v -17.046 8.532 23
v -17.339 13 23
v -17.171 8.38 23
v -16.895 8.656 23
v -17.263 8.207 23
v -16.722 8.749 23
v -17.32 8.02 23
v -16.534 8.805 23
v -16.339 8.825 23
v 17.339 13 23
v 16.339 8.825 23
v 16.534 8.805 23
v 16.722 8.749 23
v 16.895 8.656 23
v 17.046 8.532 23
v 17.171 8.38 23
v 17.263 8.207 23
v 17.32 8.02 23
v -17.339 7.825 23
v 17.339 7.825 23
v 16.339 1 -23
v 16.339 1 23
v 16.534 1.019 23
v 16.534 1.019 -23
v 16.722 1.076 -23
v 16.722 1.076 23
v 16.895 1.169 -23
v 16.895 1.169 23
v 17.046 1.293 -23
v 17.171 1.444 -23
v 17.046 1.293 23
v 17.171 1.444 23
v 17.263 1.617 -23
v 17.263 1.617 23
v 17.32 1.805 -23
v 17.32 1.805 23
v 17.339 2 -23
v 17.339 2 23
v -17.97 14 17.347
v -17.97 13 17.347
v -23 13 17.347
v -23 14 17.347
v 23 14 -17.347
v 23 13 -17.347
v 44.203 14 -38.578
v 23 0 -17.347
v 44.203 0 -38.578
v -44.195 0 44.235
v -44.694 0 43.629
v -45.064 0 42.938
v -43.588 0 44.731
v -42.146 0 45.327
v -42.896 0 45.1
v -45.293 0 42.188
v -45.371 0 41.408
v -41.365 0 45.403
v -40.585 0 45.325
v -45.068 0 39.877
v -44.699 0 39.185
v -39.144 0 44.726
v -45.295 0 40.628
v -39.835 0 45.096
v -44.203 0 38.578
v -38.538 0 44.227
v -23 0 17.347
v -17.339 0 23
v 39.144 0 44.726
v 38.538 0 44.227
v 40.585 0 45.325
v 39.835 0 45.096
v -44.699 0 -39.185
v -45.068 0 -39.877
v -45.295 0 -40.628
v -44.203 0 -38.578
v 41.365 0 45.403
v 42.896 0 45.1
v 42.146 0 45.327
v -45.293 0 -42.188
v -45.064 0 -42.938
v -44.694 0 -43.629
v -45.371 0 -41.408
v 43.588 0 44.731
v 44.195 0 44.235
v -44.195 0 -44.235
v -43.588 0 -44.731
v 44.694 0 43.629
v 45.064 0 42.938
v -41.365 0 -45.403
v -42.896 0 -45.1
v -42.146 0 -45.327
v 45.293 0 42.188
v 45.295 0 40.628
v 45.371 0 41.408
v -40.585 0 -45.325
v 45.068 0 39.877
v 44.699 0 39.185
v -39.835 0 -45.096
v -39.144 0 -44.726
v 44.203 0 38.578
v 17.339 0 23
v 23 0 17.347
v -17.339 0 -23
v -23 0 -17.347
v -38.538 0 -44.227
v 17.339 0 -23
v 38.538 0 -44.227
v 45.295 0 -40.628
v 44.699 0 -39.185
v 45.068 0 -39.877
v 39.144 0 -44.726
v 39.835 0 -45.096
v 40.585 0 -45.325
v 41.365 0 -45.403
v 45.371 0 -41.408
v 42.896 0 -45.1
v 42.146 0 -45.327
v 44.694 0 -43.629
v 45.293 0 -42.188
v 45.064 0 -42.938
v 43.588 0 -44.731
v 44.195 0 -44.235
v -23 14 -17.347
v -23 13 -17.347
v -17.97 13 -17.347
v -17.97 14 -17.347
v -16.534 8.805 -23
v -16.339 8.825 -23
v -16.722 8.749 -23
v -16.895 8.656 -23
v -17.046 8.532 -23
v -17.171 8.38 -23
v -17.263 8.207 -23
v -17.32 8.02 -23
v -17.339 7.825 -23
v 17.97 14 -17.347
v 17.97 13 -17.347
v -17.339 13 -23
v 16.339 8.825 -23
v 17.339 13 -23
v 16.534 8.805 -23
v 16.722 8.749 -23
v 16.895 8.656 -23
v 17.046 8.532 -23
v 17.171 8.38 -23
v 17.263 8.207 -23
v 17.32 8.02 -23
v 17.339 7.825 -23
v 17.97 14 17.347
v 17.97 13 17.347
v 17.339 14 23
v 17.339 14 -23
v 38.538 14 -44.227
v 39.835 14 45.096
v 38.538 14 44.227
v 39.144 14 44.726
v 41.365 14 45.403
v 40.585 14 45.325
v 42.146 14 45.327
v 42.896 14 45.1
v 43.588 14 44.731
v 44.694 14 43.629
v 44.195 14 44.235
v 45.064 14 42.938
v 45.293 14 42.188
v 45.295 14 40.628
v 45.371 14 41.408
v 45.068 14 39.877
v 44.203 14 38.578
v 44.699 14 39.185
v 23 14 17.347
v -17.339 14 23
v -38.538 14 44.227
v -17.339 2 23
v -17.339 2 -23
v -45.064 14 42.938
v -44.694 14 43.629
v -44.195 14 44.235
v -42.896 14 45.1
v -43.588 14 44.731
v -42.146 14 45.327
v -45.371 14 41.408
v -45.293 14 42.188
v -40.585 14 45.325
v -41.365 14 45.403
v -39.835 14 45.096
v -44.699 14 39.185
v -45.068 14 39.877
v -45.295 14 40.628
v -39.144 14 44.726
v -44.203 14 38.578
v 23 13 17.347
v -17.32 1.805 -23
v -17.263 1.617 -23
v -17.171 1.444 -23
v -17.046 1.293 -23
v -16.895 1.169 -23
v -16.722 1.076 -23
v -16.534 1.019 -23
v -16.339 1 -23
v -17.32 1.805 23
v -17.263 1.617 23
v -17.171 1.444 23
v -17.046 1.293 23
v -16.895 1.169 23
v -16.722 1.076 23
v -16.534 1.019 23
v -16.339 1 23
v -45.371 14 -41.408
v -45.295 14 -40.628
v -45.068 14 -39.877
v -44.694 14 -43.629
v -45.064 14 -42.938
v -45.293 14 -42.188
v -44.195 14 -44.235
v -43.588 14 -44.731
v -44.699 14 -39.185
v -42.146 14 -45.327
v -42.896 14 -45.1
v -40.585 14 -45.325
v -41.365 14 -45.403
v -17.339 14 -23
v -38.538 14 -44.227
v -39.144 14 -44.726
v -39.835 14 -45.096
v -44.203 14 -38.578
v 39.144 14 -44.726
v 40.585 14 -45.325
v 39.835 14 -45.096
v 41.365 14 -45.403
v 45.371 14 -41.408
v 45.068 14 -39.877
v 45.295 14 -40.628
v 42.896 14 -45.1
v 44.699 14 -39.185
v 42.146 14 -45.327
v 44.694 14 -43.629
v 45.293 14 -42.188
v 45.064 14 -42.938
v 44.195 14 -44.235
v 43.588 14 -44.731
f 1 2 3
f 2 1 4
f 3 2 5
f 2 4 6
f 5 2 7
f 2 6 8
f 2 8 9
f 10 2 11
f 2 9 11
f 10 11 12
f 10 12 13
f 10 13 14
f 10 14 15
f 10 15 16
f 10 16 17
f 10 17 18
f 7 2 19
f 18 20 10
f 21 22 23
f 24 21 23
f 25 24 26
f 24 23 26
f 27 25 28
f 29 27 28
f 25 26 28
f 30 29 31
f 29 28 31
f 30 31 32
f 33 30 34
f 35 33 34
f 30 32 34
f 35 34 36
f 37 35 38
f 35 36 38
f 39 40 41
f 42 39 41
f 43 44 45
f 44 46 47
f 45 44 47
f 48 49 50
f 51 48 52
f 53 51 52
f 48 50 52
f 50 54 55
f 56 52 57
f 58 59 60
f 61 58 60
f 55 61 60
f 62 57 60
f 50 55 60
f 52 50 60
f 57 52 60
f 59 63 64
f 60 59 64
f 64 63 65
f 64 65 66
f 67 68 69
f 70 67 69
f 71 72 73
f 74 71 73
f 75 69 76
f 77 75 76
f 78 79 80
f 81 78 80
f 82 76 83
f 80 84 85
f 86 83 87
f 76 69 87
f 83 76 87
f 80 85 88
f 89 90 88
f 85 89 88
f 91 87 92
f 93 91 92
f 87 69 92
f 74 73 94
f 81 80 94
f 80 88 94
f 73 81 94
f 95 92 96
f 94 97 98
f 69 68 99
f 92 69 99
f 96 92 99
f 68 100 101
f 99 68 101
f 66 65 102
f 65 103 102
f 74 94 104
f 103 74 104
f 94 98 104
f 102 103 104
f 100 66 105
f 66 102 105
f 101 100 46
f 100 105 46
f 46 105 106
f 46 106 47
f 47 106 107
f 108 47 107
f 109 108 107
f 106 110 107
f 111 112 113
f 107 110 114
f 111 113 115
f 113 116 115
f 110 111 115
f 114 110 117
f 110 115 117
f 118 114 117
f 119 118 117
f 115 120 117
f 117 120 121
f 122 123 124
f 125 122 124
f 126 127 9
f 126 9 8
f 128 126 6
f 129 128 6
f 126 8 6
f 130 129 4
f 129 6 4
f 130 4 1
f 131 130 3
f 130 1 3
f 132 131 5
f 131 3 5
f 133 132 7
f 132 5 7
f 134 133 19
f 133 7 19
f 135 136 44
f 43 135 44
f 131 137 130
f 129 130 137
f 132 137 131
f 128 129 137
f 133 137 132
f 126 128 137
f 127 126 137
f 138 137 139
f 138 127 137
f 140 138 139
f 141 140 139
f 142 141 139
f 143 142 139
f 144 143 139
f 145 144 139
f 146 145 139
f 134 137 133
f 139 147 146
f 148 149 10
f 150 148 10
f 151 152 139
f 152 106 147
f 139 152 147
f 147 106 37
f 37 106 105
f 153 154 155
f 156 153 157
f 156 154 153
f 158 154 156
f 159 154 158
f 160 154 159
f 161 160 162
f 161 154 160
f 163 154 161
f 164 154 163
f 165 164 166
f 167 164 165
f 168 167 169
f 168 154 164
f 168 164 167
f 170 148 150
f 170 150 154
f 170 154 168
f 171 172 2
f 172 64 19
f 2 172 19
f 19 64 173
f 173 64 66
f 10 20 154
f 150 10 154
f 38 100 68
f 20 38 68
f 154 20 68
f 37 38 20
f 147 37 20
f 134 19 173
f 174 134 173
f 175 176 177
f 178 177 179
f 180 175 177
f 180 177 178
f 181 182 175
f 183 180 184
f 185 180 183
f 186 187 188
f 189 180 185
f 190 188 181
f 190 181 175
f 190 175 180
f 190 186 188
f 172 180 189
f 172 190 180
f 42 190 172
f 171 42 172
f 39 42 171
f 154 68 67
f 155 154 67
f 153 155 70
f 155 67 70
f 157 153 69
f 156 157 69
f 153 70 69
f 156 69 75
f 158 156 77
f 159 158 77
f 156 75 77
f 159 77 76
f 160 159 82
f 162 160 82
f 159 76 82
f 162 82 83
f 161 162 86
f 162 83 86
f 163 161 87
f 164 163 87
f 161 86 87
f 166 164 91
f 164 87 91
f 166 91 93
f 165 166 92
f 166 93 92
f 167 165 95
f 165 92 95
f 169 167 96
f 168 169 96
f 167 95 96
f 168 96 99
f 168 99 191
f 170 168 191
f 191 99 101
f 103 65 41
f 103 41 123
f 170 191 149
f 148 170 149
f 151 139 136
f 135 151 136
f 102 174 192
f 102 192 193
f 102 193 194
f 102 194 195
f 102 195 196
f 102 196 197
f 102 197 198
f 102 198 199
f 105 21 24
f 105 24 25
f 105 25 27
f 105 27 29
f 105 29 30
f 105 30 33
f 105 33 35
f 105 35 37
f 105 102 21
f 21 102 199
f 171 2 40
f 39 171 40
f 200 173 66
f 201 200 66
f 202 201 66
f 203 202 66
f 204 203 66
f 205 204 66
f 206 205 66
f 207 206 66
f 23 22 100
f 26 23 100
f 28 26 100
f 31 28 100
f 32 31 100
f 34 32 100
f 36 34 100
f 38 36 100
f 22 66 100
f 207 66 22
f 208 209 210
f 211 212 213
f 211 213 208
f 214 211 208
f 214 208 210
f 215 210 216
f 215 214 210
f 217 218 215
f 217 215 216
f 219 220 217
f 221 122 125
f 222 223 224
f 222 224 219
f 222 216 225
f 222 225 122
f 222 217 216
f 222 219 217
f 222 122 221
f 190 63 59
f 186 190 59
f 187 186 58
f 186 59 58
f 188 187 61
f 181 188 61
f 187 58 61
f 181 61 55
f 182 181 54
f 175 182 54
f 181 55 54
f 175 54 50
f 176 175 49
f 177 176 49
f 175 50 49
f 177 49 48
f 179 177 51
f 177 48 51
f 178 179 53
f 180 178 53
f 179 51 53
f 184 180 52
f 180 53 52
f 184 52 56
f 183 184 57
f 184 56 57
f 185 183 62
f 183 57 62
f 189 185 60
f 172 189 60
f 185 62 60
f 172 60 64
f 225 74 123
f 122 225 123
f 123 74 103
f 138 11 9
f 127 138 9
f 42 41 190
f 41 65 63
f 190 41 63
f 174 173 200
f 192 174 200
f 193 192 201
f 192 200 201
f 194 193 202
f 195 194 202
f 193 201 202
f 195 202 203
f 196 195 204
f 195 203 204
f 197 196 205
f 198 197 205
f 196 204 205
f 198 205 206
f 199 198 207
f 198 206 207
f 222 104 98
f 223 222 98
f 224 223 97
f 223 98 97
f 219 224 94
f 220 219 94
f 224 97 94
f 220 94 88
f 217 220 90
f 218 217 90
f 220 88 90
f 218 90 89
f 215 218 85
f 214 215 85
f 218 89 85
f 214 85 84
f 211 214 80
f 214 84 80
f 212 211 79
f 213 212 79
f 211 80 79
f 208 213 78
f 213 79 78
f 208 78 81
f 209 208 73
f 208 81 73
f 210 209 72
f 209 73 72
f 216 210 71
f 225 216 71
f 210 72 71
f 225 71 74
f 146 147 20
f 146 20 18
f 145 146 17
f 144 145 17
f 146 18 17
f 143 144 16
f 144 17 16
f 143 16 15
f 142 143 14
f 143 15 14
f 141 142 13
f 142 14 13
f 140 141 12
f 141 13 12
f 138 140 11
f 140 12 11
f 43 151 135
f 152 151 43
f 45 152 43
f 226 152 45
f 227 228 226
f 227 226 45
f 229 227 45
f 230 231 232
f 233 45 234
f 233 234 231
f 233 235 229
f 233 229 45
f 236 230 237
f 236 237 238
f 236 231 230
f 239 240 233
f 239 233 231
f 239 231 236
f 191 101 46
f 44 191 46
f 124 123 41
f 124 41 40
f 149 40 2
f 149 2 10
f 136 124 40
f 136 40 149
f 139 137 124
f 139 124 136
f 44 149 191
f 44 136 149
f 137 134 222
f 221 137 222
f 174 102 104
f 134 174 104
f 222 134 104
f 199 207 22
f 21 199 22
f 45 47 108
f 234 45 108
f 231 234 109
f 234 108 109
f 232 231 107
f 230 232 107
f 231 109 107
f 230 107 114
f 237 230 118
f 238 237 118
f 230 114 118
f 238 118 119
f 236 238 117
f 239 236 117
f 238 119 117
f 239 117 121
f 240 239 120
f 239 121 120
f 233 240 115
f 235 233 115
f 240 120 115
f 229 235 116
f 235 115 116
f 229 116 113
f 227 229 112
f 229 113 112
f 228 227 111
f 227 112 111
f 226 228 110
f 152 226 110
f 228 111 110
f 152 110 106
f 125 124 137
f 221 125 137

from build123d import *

# Parameters (mm, degrees)
SKETCH1_W           = 46
SKETCH1_H           = 46
BOSS_EXTRUDE1_DEPTH = 13
CUT_EXTRUDE2_DEPTH  = 10
BOSS_EXTRUDE2_START = -13
BOSS_EXTRUDE2_DEPTH = 14
CUT_EXTRUDE4_DEPTH  = 63


# Read off the part's stored shape, not the designer's step: Boss-Extrude2
with BuildPart() as part:
    # Sketch1 → Boss-Extrude1 (new body)
    with BuildSketch(Plane(origin=(0, 0, 0), x_dir=(1, 0, 0), z_dir=(0, 1, 0))):
        Rectangle(SKETCH1_W, SKETCH1_H)
    extrude(amount=BOSS_EXTRUDE1_DEPTH)

    # Sketch2 → Cut-Extrude2 (cut)
    with BuildSketch(Plane(origin=(0, 13, 0), x_dir=(1, 0, 0), z_dir=(0, 1, 0))):
        Polygon((17.339375574, 23), (17.969631493, 17.346908404), (23, 17.346908404), (23, 23), align=None)
        Polygon((-23, 23), (-17.339375574, 23), (-17.969631493, 17.346908404), (-23, 17.346908404), align=None)
        Polygon((-23, -17.346908404), (-23, -23), (-17.339375574, -23), (-17.969631493, -17.346908404), align=None)
        Polygon((17.339375574, -23), (23, -23), (23, -17.346908404), (17.969631493, -17.346908404), align=None)
    extrude(amount=-CUT_EXTRUDE2_DEPTH, mode=Mode.SUBTRACT)

    # Boss-Extrude2 outline → Boss-Extrude2 (add)
    with BuildSketch(Plane(origin=(0, 13, 0), x_dir=(1, 0, 0), z_dir=(0, 1, 0)).offset(BOSS_EXTRUDE2_START)):
        with BuildLine():
            Line((-38.538452146, -44.227320898), (-17.339375574, -23))
            Line((-17.339375574, -23), (-17.969631493, -17.346908404))
            Line((-17.969631493, -17.346908404), (-23, -17.346908404))
            Line((-23, -17.346908404), (-44.202839223, -38.577999476))
            ThreePointArc((-44.202839223, -38.577999476), (-44.195306563, -44.234853893), (-38.538452146, -44.227320898))
        make_face()
        with BuildLine():
            Line((-17.969631493, 17.346908404), (-17.339375574, 23))
            Line((-17.339375574, 23), (-38.538452146, 44.227320898))
            ThreePointArc((-38.538452146, 44.227320898), (-44.195306563, 44.234853893), (-44.202839223, 38.577999476))
            Line((-44.202839223, 38.577999476), (-23, 17.346908404))
            Line((-23, 17.346908404), (-17.969631493, 17.346908404))
        make_face()
        with BuildLine():
            Line((44.202839223, -38.577999476), (23, -17.346908404))
            Line((23, -17.346908404), (17.969631493, -17.346908404))
            Line((17.969631493, -17.346908404), (17.339375574, -23))
            Line((17.339375574, -23), (38.538452146, -44.227320898))
            ThreePointArc((38.538452146, -44.227320898), (44.195306563, -44.234853893), (44.202839223, -38.577999476))
        make_face()
        with BuildLine():
            Line((17.969631493, 17.346908404), (23, 17.346908404))
            Line((23, 17.346908404), (44.202839223, 38.577999476))
            ThreePointArc((44.202839223, 38.577999476), (44.195306563, 44.234853893), (38.538452146, 44.227320898))
            Line((38.538452146, 44.227320898), (17.339375574, 23))
            Line((17.339375574, 23), (17.969631493, 17.346908404))
        make_face()
    extrude(amount=BOSS_EXTRUDE2_DEPTH)

    # Sketch5 → Cut-Extrude4 (cut)
    with BuildSketch(Plane.XY.offset(23)):
        with BuildLine():
            Line((-16.339375574, 1), (16.339375574, 1))
            ThreePointArc((16.339375574, 1), (17.046482355, 1.292893219), (17.339375574, 2))
            Line((17.339375574, 2), (17.339375574, 7.824688375))
            ThreePointArc((17.339375574, 7.824688375), (17.046482355, 8.531795157), (16.339375574, 8.824688375))
            Line((16.339375574, 8.824688375), (-16.339375574, 8.824688375))
            ThreePointArc((-16.339375574, 8.824688375), (-17.046482355, 8.531795157), (-17.339375574, 7.824688375))
            Line((-17.339375574, 7.824688375), (-17.339375574, 2))
            ThreePointArc((-17.339375574, 2), (-17.046482355, 1.292893219), (-16.339375574, 1))
        make_face()
    extrude(amount=-CUT_EXTRUDE4_DEPTH, mode=Mode.SUBTRACT)


solid = part.part
